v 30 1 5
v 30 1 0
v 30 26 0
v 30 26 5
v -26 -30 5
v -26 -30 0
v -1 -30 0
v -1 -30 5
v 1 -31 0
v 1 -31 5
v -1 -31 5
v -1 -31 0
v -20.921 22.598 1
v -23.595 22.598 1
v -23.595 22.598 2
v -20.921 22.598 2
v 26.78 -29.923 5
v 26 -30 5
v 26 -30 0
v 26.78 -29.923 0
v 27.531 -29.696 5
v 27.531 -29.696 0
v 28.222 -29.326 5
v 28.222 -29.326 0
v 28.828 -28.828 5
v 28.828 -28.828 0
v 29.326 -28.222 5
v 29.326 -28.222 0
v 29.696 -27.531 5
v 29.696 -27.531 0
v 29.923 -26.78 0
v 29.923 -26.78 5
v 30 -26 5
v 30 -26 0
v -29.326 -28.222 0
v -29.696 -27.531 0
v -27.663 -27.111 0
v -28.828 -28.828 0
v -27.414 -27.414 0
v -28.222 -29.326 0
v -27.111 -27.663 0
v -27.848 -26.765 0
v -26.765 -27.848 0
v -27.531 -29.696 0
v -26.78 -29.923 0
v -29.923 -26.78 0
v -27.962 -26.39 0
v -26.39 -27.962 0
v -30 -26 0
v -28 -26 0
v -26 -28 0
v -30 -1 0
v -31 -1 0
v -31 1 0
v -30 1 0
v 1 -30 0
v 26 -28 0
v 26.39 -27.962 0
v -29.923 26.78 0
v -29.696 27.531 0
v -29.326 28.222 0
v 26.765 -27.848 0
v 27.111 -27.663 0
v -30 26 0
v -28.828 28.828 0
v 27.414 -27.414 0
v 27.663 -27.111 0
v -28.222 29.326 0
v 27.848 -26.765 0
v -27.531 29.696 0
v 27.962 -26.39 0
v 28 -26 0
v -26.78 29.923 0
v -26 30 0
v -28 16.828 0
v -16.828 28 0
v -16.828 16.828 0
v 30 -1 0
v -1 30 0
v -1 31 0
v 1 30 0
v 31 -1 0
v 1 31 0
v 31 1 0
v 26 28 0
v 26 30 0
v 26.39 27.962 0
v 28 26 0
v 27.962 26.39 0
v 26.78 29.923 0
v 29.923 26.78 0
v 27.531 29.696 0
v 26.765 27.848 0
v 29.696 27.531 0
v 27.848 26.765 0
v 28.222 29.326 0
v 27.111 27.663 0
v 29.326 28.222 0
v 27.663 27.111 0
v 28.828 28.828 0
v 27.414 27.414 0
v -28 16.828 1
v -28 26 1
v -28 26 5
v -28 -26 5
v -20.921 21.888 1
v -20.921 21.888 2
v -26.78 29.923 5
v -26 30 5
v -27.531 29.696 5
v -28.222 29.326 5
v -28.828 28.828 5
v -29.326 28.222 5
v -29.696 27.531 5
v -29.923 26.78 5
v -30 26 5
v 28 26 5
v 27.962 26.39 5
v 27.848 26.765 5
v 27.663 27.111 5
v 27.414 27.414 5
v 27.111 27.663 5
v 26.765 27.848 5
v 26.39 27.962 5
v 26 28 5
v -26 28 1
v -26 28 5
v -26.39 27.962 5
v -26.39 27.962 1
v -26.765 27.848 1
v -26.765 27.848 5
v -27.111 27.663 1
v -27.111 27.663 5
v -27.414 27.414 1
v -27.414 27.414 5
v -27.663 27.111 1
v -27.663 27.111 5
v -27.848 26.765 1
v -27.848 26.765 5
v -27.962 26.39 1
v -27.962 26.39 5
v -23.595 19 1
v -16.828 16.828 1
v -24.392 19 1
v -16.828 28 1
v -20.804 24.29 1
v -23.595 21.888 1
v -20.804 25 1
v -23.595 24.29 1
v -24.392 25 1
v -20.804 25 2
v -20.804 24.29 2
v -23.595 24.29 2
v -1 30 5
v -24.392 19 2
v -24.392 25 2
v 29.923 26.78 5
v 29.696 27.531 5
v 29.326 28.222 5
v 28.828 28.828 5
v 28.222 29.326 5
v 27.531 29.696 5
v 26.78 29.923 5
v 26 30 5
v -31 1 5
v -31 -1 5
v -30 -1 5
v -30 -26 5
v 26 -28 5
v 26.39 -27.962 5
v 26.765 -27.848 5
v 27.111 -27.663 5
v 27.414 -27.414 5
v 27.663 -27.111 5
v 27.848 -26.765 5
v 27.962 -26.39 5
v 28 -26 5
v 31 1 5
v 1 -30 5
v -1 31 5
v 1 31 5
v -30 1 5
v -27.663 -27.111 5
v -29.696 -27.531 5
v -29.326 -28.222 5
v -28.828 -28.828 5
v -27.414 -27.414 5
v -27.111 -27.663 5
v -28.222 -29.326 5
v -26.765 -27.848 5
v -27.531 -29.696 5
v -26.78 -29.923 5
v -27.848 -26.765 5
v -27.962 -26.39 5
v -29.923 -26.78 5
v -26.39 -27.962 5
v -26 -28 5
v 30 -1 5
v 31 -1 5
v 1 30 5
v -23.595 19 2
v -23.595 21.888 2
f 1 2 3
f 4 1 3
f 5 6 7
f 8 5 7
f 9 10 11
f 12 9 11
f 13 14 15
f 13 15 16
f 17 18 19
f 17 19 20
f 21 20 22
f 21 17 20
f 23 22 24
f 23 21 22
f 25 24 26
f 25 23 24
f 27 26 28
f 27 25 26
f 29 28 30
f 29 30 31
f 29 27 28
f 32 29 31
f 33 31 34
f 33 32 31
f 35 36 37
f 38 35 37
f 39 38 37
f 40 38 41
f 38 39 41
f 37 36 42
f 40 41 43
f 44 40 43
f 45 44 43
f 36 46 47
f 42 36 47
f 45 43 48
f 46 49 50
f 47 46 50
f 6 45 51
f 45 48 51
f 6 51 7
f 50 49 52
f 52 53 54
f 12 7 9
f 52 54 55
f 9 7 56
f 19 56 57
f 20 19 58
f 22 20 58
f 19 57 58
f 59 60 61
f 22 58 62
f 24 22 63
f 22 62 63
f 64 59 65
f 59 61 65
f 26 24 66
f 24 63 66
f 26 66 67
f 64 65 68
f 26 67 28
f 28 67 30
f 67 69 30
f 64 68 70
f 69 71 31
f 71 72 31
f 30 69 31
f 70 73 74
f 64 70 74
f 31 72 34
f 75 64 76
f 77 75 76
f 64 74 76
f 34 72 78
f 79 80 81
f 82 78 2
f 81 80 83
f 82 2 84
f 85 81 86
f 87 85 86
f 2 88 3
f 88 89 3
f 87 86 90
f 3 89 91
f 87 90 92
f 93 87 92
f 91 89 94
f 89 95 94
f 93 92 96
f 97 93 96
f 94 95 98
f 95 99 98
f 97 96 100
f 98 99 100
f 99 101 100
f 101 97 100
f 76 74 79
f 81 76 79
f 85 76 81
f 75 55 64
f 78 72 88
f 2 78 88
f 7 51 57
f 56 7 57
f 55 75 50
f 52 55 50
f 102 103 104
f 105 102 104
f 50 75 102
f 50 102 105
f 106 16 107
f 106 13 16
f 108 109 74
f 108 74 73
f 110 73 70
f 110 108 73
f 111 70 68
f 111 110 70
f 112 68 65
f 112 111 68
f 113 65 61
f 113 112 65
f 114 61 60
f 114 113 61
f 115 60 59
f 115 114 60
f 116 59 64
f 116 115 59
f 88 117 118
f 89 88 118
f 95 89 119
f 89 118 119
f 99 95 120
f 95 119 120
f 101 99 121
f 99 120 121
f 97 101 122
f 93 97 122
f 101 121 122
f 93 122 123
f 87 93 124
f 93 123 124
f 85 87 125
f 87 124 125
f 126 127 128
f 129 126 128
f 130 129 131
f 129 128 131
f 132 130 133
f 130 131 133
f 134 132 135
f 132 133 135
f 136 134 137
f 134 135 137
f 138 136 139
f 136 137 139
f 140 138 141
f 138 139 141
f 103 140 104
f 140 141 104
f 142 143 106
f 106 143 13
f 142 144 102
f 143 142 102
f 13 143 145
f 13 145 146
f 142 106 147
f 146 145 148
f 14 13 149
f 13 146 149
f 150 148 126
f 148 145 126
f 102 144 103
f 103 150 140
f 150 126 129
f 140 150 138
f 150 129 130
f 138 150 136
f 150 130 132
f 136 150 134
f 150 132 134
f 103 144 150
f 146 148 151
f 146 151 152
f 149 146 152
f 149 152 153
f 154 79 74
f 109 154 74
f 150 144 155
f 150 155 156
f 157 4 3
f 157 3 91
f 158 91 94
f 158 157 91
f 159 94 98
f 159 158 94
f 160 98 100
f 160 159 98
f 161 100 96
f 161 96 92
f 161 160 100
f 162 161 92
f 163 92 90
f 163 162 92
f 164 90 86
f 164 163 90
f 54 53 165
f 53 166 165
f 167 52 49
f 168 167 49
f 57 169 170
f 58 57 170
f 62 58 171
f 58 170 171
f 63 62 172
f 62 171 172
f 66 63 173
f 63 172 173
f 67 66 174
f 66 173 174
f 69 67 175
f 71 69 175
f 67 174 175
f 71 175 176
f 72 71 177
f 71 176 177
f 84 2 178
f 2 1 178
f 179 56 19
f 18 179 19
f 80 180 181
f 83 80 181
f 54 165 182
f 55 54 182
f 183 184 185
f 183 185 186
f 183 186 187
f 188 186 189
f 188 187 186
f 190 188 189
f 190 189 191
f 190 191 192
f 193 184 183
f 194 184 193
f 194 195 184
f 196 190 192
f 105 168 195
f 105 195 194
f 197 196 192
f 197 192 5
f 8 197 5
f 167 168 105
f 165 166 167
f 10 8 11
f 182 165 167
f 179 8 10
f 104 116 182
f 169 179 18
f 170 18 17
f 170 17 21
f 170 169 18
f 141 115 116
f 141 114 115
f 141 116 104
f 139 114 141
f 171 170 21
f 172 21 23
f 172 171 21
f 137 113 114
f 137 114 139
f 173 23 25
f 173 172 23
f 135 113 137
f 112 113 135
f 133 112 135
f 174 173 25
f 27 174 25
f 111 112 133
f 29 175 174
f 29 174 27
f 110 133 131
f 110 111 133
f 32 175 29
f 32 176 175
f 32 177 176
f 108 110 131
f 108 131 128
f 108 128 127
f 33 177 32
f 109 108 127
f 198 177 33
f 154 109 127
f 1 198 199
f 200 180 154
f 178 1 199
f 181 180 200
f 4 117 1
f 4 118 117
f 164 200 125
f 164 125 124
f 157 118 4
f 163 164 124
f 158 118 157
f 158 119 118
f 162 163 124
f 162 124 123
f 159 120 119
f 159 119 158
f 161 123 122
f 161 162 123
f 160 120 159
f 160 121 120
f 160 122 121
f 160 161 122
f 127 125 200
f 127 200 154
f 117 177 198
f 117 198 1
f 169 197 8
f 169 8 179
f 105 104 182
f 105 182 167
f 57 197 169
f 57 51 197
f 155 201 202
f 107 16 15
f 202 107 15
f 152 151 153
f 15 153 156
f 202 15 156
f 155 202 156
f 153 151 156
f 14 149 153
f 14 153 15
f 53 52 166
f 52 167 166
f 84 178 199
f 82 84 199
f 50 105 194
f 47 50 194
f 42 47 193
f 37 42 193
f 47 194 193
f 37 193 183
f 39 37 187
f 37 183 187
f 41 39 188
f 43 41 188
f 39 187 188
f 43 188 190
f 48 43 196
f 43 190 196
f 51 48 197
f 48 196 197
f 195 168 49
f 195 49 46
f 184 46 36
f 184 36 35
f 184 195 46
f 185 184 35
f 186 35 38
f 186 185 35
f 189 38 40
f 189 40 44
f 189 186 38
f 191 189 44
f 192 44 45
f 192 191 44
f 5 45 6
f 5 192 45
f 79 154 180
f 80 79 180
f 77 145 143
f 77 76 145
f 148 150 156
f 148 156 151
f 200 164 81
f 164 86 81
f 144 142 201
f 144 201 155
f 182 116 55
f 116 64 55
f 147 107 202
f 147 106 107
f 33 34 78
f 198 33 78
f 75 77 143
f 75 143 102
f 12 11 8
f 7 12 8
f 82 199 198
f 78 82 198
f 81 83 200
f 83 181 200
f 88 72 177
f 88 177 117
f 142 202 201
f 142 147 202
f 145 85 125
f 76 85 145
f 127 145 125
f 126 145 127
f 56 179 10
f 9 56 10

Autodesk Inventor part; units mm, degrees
ref_plane "YZ Plane" through (0, 0, 0) normal (1, 0, 0) x (0, 1, 0)
ref_plane "XZ Plane" through (0, 0, 0) normal (0, 1, 0) x (-1, 0, 0)
ref_plane "XY Plane" through (0, 0, 0) normal (0, 0, 1) x (1, 0, 0)
sketch "Sketch1" plane through (0, 0, 0) normal (0, 0, 1) x (1, 0, 0)
  line L0 (-30, -30) -> (30, -30)
  line L1 (30, -30) -> (30, 30)
  line L2 (30, 30) -> (-30, 30)
  line L3 (-30, 30) -> (-30, -30)
  point P0 (0, 0)
  point P1 (-30, 0)
  point P2 (0, 30)
  dimension "d0" = 60
extrude "Extrusion1" add sketch "Sketch1" along normal blind 5
sketch "Sketch2" plane through (0, 0, 5) normal (0, 0, 1) x (1, 0, 0)
  line L0 (30, -30) -> (30, 30) projected
  line L1 (30, 1) -> (31, 1)
  line L2 (31, 1) -> (31, -1)
  line L3 (31, -1) -> (30, -1)
  line L4 (30, -1) -> (30, 1)
  point P0 (0, 0)
  point P1 (30, 0)
  point P2 (31, 0)
  dimension "d3" = 2
  dimension "d4" = 1
extrude "Extrusion2" add sketch "Sketch2" against normal up to surface (5 mm away)
pattern_circular "Circular Pattern1" count 4 over 360 about axis through (0, 0, -10) along (0, 0, 1) of "Extrusion2"
fillet "Fillet1" radius 4 4 edges at (30, -30, 2.5) (30, 30, 2.5) (-30, 30, 2.5) (-30, -30, 2.5)
shell "Shell1" thickness 2 removed faces 2 at (-0.3333, -9.3333, 5) at (-0.3333, -9.3333, 0)
sketch "Sketch3" plane through (0, 0, 0) normal (0, 0, -1) x (-1, 0, 0)
  arc A0 (30, 26) -> (26, 30) centre (26, 26) ccw projected
  line L0 (28.8284, 28.8284) -> (16.8284, 28.8284)
  line L1 (16.8284, 28.8284) -> (16.8284, 16.8284)
  line L2 (16.8284, 16.8284) -> (28.8284, 16.8284)
  line L3 (28.8284, 16.8284) -> (28.8284, 28.8284)
  point P0 (0, 0)
  dimension "d12" = 12
extrude "Extrusion3" add sketch "Sketch3" against normal blind 1
sketch "Sketch4" plane through (0, 0, 1) normal (0, 0, 1) x (1, 0, 0)
  arc A0 (-26, 28) -> (-28, 26) centre (-26, 26) ccw projected
  line L0 (-25, 25) -> (-22.4899, 25) construction
  line L1 (-22.4899, 25) -> (-22.4899, 17.9124) construction
  line L2 (-22.4899, 17.9124) -> (-25, 17.9124) construction
  line L3 (-25, 17.9124) -> (-25, 25) construction
  line L4 (-20.8039, 24.2901) -> (-23.5948, 24.2901)
  line L5 (-23.5948, 24.2901) -> (-23.5948, 22.5981)
  line L6 (-23.5948, 22.5981) -> (-20.9206, 22.5981)
  line L7 (-20.9206, 22.5981) -> (-20.9206, 21.8882)
  line L8 (-20.9206, 21.8882) -> (-23.5948, 21.8882)
  line L9 (-23.5948, 21.8882) -> (-23.5948, 19)
  line L10 (-23.5948, 19) -> (-24.3922, 19)
  line L11 (-24.3922, 19) -> (-24.3922, 25)
  line L12 (-24.3922, 25) -> (-20.8039, 25)
  line L13 (-20.8039, 25) -> (-20.8039, 24.2901)
  point P0 (0, 0)
  dimension "d15" = 1
  dimension "d16" = 1
emboss "Emboss1" sketch "Sketch4" operation add depth 1 direction (0, 0, -1)
properties part number "Jerk Store Test"
